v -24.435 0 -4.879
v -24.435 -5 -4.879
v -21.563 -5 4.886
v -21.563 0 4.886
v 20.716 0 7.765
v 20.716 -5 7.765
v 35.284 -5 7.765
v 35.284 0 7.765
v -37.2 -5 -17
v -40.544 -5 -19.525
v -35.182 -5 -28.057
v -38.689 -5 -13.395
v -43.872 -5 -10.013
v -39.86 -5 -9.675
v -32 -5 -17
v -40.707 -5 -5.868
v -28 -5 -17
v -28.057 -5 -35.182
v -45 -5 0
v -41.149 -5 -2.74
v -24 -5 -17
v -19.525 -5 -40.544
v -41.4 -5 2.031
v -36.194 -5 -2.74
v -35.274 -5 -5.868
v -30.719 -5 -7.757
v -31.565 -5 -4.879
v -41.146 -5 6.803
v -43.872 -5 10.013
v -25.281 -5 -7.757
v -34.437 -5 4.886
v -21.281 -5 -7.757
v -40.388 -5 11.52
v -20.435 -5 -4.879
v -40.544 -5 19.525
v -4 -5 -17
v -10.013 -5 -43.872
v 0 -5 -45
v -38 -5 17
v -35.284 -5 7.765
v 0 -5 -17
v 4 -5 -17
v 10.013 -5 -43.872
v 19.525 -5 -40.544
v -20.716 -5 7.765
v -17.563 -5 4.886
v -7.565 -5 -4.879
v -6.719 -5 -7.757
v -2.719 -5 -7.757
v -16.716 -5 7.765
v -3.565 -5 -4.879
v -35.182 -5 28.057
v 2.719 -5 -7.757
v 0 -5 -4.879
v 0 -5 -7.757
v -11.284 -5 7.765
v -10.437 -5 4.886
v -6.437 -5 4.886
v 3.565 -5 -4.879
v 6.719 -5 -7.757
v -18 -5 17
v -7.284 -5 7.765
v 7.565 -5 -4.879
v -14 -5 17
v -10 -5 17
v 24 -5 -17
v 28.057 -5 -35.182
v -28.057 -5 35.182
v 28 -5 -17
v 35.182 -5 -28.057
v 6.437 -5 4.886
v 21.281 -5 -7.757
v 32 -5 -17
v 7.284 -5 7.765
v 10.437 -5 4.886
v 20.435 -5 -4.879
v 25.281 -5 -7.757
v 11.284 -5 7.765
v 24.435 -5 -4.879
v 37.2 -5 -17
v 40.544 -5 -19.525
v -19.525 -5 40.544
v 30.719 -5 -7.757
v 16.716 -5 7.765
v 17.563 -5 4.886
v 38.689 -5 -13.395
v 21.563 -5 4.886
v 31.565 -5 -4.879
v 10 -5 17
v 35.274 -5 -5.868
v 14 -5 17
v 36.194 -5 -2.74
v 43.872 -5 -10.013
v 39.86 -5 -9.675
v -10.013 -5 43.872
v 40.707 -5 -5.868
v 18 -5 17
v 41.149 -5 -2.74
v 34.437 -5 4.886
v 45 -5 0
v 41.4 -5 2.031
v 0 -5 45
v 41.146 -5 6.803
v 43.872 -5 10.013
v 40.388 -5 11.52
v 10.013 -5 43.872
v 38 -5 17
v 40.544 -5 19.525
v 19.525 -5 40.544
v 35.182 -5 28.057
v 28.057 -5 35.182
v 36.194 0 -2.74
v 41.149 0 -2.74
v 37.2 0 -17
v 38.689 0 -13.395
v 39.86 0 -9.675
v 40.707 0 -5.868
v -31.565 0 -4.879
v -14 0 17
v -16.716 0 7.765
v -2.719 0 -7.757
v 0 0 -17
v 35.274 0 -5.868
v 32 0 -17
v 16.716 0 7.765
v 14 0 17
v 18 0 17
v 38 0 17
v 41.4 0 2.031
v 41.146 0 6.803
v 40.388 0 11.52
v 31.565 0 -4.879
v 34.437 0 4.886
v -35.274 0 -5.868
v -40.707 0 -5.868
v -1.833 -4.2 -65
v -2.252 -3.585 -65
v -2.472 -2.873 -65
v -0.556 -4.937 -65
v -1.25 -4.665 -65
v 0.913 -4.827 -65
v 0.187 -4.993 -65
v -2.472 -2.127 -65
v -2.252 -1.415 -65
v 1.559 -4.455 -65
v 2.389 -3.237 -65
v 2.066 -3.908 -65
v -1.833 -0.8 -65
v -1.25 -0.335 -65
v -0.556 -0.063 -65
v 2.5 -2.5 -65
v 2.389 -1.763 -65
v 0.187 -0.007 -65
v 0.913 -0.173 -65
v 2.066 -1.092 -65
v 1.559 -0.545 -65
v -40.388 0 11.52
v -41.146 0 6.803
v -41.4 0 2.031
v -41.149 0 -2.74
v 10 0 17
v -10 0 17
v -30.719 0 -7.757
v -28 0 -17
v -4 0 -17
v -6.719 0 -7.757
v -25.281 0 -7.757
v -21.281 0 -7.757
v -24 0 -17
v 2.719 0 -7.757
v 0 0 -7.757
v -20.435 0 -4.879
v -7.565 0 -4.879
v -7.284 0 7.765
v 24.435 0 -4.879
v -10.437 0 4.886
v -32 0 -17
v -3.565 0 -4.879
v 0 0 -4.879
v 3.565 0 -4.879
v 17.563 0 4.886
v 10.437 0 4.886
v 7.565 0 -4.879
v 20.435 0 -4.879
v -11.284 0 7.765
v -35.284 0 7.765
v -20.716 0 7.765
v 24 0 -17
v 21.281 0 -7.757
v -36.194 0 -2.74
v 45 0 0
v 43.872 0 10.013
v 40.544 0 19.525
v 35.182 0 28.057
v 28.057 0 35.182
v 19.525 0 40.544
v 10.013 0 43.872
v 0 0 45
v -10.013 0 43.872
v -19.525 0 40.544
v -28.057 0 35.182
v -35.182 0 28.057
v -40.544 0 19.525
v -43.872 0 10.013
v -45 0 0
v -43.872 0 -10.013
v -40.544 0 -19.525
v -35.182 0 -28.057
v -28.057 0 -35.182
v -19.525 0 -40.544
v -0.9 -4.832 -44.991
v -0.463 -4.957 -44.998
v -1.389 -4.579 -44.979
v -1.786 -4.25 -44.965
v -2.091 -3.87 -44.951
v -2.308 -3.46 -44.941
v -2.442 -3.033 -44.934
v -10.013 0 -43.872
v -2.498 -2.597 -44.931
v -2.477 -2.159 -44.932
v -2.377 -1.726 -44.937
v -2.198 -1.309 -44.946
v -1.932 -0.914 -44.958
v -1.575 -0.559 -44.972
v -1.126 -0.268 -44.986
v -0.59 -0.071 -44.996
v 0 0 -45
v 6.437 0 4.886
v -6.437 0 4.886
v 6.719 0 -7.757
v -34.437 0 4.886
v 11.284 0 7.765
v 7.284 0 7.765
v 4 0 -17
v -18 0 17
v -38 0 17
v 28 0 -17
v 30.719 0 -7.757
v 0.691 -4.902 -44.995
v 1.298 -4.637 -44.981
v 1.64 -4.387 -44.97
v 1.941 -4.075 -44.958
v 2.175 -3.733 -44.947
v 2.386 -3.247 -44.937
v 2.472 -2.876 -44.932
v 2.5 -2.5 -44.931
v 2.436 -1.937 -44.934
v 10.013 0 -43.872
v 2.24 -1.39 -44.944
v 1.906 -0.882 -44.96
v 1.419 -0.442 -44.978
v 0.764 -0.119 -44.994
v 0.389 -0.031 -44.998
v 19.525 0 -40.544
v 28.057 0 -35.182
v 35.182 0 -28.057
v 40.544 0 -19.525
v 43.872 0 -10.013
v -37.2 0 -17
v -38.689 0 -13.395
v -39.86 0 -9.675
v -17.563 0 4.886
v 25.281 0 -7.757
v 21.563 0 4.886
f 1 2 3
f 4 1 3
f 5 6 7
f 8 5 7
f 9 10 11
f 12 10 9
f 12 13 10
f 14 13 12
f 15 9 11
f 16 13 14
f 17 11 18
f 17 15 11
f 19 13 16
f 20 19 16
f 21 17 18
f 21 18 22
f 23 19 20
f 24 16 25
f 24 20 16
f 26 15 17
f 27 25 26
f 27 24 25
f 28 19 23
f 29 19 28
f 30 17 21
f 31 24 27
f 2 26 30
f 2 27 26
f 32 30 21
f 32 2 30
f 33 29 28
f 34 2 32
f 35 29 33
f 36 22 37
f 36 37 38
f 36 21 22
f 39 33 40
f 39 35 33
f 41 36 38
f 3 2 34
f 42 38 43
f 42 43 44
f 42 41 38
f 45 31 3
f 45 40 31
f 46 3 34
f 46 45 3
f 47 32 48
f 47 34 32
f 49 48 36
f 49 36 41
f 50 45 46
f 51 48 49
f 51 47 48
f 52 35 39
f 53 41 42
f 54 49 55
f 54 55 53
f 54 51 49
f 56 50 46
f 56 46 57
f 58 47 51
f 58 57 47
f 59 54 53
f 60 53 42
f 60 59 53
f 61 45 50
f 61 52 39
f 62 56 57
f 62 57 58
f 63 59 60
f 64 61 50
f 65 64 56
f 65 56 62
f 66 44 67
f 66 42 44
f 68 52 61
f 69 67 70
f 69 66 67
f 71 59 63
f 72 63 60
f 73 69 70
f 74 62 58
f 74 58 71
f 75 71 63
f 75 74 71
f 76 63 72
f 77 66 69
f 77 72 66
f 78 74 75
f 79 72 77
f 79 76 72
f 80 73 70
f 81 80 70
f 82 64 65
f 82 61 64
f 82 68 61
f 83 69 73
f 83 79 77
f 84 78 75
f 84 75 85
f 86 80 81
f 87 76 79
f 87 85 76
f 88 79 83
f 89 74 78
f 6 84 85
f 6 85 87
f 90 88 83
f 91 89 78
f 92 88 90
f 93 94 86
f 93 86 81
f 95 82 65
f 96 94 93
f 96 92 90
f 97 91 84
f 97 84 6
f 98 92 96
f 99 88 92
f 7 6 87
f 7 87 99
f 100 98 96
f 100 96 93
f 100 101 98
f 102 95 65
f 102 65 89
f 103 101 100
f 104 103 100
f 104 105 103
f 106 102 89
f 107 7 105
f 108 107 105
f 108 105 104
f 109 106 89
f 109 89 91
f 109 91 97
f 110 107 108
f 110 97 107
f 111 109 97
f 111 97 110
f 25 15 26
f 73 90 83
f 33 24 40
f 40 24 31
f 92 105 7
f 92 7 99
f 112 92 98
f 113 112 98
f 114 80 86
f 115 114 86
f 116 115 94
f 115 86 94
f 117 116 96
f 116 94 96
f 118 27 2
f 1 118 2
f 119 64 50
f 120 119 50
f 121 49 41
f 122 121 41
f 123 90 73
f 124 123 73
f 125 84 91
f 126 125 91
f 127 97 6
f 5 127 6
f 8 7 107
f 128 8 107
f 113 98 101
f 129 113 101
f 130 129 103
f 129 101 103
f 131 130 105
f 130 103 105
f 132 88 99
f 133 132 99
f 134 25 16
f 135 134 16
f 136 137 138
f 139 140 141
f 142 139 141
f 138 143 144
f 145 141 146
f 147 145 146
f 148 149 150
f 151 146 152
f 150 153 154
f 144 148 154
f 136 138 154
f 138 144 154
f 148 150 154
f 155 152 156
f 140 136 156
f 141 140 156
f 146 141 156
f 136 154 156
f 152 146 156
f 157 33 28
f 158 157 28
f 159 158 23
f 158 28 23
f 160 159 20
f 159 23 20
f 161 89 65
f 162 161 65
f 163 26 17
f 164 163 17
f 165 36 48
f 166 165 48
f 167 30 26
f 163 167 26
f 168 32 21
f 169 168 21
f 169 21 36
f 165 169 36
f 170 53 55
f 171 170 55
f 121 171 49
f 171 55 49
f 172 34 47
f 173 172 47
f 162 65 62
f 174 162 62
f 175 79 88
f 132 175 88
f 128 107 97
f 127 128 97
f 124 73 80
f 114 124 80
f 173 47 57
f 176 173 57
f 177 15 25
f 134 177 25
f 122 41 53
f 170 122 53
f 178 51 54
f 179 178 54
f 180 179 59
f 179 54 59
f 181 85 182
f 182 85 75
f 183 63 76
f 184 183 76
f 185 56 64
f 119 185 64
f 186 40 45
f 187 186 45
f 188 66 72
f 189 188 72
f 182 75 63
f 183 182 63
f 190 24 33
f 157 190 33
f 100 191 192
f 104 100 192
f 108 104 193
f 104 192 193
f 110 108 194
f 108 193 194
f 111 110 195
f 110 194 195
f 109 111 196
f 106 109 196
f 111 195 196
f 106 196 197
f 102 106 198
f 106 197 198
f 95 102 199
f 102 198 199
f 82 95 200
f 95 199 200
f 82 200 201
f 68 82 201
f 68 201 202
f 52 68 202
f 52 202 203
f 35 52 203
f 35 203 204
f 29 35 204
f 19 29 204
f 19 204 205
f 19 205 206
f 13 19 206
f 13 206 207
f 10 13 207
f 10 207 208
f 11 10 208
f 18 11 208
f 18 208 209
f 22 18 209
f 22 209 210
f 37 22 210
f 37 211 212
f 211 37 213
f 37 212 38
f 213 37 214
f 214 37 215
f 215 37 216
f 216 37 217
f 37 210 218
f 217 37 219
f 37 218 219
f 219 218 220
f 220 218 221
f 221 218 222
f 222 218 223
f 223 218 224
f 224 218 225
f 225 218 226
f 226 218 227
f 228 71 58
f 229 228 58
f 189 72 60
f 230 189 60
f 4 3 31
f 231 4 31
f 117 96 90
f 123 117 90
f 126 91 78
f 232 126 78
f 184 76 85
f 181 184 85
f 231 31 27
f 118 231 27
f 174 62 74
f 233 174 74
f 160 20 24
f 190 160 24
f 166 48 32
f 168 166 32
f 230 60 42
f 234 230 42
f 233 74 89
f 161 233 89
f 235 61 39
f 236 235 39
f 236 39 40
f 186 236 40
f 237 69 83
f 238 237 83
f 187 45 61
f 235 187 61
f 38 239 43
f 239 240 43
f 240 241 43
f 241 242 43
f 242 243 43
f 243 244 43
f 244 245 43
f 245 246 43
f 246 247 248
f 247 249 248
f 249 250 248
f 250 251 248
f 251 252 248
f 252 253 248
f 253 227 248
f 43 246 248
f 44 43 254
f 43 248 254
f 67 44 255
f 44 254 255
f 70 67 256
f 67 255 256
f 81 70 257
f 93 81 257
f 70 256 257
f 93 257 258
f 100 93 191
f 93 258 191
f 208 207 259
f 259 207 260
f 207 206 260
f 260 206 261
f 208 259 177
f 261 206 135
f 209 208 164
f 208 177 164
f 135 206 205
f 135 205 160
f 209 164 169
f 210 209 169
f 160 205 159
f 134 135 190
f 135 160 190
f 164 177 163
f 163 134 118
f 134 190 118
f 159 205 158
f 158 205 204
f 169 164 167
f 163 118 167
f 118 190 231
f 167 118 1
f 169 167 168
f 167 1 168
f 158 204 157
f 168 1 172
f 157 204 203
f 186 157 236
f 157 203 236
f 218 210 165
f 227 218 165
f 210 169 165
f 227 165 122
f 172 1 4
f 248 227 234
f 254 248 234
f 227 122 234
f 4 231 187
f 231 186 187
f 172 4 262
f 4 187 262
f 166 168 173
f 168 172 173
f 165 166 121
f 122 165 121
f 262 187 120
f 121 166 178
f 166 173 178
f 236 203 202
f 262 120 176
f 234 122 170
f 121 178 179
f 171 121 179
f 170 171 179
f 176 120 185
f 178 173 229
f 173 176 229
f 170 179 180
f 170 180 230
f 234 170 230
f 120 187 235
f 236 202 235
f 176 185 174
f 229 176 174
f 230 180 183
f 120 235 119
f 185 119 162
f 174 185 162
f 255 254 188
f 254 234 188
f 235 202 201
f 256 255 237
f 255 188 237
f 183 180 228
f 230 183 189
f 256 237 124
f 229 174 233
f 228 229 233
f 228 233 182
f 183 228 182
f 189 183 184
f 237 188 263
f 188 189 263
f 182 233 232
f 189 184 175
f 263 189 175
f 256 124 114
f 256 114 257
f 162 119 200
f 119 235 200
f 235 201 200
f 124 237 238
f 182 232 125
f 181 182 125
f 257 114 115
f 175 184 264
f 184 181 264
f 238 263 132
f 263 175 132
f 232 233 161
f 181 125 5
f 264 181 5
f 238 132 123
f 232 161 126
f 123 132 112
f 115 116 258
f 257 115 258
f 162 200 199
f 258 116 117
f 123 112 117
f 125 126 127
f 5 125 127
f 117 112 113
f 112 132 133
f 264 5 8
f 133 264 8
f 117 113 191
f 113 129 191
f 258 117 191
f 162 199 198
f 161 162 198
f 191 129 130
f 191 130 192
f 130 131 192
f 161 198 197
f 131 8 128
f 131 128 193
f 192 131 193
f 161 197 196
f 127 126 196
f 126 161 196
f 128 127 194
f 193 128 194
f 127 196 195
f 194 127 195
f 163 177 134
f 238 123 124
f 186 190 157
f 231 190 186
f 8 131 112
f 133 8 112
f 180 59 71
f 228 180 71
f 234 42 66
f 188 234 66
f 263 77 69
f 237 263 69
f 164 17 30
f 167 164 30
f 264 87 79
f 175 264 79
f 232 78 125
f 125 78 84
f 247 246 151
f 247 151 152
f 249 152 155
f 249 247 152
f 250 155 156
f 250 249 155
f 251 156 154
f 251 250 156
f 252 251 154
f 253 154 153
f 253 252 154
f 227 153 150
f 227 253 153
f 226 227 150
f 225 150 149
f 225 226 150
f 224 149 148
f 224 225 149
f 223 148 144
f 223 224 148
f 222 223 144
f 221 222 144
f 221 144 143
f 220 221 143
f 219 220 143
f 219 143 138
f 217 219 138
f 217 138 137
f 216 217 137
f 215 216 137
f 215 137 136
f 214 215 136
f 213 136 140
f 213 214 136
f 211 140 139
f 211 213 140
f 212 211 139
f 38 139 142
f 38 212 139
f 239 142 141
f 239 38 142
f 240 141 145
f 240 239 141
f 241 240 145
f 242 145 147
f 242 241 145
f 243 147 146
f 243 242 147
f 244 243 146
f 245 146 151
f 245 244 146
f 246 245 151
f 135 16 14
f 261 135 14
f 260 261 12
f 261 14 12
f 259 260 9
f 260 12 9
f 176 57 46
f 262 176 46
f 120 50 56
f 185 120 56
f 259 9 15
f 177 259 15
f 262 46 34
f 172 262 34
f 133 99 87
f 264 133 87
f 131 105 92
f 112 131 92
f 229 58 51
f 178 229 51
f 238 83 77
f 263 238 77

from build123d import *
from build123d import SkipClean  # not in build123d's __all__

# Parameters (mm, degrees)
F0_R     = 45
F1_DEPTH = 5
F2_R     = 2.5
F3_DEPTH = 65
F7_DEPTH = 5.0010001144


# Not quite as in the source:
# - a feature of the source that left no trace in its solid (it failed there, or was rolled back) is left out
# - a feature names something its author has since deleted; it is built from what else it names


with BuildPart() as f1:
    # F0 (on Front) → F1 (new body)
    with BuildSketch(Plane.XZ):
        Circle(F0_R)
    extrude(amount=F1_DEPTH)

    # F2 (on Top) → F3 (join)
    with BuildSketch(Plane.XY):
        with Locations((0, -2.5)):
            Circle(F2_R)
    with SkipClean():  # cleaning this boolean's faces spoils the solid; the shape is the same uncleaned
        extrude(amount=-F3_DEPTH)

    # F6 (on face) → F7 (cut, through all)
    with BuildSketch(Plane.XZ.offset(5)):
        Polygon((-20.7163122443, 7.7645383693), (-18, 17), (-38, 17), (-35.2836877557, 7.7645383693), align=None)
        with BuildLine():
            Line((-36.1941438848, -2.7399107917), (-40.3882877696, 11.5201784167))
            ThreePointArc((-40.3882877696, 11.5201784167), (-41.3363102402, 4.4204212554), (-41.1493788917, -2.7399107917))
            Line((-41.1493788917, -2.7399107917), (-36.1941438848, -2.7399107917))
        make_face()
        with BuildLine():
            Line((-32, -17), (-35.2739794285, -5.8684699433))
            Line((-35.2739794285, -5.8684699433), (-40.7068101942, -5.8684699433))
            ThreePointArc((-40.7068101942, -5.8684699433), (-39.3148104816, -11.548035888), (-37.2002845672, -17))
            Line((-37.2002845672, -17), (-32, -17))
        make_face()
        Polygon((-24.4349641852, -4.8788782297), (-21.5628112163, 4.8864418646), (-34.4371887837, 4.8864418646), (-31.5650358148, -4.8788782297), align=None)
        Polygon((-28, -17), (-25.2814631572, -7.7569747344), (-30.7185368428, -7.7569747344), align=None)
        Polygon((-11.2836877557, 7.7645383693), (-14, 17), (-16.7163122443, 7.7645383693), align=None)
        Polygon((-7.5650358148, -4.8788782297), (-10.4371887837, 4.8864418646), (-17.5628112163, 4.8864418646), (-20.4349641852, -4.8788782297), align=None)
        Polygon((-4, -17), (-6.7185368428, -7.7569747344), (-21.2814631572, -7.7569747344), (-24, -17), align=None)
        Polygon((0, -7.7569747344), (-2.7185368428, -7.7569747344), (0, -17), align=None)
        Polygon((0, -7.7569747344), (0, -17), (2.7185368428, -7.7569747344), align=None)
        Polygon((6.4371887837, 4.8864418646), (0, 4.8864418646), (0, 0), (0, -4.8788782297), (3.5650358148, -4.8788782297), align=None)
        Polygon((0, 4.8864418646), (-6.4371887837, 4.8864418646), (-3.5650358148, -4.8788782297), (0, -4.8788782297), (0, 0), align=None)
        Polygon((0, 17), (-10, 17), (-7.2836877557, 7.7645383693), (0, 7.7645383693), align=None)
        Polygon((10, 17), (0, 17), (0, 7.7645383693), (7.2836877557, 7.7645383693), align=None)
        Polygon((16.7163122443, 7.7645383693), (14, 17), (11.2836877557, 7.7645383693), align=None)
        Polygon((17.5628112163, 4.8864418646), (10.4371887837, 4.8864418646), (7.5650358148, -4.8788782297), (20.4349641852, -4.8788782297), align=None)
        Polygon((21.2814631572, -7.7569747344), (6.7185368428, -7.7569747344), (4, -17), (24, -17), align=None)
        Polygon((25.2814631572, -7.7569747344), (28, -17), (30.7185368428, -7.7569747344), align=None)
        Polygon((24.4349641852, -4.8788782297), (31.5650358148, -4.8788782297), (34.4371887837, 4.8864418646), (21.5628112163, 4.8864418646), align=None)
        Polygon((20.7163122443, 7.7645383693), (35.2836877557, 7.7645383693), (38, 17), (18, 17), align=None)
        with BuildLine():
            ThreePointArc((41.1493788917, -2.7399107917), (41.3363102402, 4.4204212554), (40.3882877696, 11.5201784167))
            Line((40.3882877696, 11.5201784167), (36.1941438848, -2.7399107917))
            Line((36.1941438848, -2.7399107917), (41.1493788917, -2.7399107917))
        make_face()
        with BuildLine():
            Line((40.7068101942, -5.8684699433), (35.2739794285, -5.8684699433))
            Line((35.2739794285, -5.8684699433), (32, -17))
            Line((32, -17), (37.2002845672, -17))
            ThreePointArc((37.2002845672, -17), (39.3148104816, -11.548035888), (40.7068101942, -5.8684699433))
        make_face()
    with SkipClean():  # cleaning this boolean's faces spoils the solid; the shape is the same uncleaned
        extrude(amount=-F7_DEPTH, mode=Mode.SUBTRACT)


solid = f1.part
